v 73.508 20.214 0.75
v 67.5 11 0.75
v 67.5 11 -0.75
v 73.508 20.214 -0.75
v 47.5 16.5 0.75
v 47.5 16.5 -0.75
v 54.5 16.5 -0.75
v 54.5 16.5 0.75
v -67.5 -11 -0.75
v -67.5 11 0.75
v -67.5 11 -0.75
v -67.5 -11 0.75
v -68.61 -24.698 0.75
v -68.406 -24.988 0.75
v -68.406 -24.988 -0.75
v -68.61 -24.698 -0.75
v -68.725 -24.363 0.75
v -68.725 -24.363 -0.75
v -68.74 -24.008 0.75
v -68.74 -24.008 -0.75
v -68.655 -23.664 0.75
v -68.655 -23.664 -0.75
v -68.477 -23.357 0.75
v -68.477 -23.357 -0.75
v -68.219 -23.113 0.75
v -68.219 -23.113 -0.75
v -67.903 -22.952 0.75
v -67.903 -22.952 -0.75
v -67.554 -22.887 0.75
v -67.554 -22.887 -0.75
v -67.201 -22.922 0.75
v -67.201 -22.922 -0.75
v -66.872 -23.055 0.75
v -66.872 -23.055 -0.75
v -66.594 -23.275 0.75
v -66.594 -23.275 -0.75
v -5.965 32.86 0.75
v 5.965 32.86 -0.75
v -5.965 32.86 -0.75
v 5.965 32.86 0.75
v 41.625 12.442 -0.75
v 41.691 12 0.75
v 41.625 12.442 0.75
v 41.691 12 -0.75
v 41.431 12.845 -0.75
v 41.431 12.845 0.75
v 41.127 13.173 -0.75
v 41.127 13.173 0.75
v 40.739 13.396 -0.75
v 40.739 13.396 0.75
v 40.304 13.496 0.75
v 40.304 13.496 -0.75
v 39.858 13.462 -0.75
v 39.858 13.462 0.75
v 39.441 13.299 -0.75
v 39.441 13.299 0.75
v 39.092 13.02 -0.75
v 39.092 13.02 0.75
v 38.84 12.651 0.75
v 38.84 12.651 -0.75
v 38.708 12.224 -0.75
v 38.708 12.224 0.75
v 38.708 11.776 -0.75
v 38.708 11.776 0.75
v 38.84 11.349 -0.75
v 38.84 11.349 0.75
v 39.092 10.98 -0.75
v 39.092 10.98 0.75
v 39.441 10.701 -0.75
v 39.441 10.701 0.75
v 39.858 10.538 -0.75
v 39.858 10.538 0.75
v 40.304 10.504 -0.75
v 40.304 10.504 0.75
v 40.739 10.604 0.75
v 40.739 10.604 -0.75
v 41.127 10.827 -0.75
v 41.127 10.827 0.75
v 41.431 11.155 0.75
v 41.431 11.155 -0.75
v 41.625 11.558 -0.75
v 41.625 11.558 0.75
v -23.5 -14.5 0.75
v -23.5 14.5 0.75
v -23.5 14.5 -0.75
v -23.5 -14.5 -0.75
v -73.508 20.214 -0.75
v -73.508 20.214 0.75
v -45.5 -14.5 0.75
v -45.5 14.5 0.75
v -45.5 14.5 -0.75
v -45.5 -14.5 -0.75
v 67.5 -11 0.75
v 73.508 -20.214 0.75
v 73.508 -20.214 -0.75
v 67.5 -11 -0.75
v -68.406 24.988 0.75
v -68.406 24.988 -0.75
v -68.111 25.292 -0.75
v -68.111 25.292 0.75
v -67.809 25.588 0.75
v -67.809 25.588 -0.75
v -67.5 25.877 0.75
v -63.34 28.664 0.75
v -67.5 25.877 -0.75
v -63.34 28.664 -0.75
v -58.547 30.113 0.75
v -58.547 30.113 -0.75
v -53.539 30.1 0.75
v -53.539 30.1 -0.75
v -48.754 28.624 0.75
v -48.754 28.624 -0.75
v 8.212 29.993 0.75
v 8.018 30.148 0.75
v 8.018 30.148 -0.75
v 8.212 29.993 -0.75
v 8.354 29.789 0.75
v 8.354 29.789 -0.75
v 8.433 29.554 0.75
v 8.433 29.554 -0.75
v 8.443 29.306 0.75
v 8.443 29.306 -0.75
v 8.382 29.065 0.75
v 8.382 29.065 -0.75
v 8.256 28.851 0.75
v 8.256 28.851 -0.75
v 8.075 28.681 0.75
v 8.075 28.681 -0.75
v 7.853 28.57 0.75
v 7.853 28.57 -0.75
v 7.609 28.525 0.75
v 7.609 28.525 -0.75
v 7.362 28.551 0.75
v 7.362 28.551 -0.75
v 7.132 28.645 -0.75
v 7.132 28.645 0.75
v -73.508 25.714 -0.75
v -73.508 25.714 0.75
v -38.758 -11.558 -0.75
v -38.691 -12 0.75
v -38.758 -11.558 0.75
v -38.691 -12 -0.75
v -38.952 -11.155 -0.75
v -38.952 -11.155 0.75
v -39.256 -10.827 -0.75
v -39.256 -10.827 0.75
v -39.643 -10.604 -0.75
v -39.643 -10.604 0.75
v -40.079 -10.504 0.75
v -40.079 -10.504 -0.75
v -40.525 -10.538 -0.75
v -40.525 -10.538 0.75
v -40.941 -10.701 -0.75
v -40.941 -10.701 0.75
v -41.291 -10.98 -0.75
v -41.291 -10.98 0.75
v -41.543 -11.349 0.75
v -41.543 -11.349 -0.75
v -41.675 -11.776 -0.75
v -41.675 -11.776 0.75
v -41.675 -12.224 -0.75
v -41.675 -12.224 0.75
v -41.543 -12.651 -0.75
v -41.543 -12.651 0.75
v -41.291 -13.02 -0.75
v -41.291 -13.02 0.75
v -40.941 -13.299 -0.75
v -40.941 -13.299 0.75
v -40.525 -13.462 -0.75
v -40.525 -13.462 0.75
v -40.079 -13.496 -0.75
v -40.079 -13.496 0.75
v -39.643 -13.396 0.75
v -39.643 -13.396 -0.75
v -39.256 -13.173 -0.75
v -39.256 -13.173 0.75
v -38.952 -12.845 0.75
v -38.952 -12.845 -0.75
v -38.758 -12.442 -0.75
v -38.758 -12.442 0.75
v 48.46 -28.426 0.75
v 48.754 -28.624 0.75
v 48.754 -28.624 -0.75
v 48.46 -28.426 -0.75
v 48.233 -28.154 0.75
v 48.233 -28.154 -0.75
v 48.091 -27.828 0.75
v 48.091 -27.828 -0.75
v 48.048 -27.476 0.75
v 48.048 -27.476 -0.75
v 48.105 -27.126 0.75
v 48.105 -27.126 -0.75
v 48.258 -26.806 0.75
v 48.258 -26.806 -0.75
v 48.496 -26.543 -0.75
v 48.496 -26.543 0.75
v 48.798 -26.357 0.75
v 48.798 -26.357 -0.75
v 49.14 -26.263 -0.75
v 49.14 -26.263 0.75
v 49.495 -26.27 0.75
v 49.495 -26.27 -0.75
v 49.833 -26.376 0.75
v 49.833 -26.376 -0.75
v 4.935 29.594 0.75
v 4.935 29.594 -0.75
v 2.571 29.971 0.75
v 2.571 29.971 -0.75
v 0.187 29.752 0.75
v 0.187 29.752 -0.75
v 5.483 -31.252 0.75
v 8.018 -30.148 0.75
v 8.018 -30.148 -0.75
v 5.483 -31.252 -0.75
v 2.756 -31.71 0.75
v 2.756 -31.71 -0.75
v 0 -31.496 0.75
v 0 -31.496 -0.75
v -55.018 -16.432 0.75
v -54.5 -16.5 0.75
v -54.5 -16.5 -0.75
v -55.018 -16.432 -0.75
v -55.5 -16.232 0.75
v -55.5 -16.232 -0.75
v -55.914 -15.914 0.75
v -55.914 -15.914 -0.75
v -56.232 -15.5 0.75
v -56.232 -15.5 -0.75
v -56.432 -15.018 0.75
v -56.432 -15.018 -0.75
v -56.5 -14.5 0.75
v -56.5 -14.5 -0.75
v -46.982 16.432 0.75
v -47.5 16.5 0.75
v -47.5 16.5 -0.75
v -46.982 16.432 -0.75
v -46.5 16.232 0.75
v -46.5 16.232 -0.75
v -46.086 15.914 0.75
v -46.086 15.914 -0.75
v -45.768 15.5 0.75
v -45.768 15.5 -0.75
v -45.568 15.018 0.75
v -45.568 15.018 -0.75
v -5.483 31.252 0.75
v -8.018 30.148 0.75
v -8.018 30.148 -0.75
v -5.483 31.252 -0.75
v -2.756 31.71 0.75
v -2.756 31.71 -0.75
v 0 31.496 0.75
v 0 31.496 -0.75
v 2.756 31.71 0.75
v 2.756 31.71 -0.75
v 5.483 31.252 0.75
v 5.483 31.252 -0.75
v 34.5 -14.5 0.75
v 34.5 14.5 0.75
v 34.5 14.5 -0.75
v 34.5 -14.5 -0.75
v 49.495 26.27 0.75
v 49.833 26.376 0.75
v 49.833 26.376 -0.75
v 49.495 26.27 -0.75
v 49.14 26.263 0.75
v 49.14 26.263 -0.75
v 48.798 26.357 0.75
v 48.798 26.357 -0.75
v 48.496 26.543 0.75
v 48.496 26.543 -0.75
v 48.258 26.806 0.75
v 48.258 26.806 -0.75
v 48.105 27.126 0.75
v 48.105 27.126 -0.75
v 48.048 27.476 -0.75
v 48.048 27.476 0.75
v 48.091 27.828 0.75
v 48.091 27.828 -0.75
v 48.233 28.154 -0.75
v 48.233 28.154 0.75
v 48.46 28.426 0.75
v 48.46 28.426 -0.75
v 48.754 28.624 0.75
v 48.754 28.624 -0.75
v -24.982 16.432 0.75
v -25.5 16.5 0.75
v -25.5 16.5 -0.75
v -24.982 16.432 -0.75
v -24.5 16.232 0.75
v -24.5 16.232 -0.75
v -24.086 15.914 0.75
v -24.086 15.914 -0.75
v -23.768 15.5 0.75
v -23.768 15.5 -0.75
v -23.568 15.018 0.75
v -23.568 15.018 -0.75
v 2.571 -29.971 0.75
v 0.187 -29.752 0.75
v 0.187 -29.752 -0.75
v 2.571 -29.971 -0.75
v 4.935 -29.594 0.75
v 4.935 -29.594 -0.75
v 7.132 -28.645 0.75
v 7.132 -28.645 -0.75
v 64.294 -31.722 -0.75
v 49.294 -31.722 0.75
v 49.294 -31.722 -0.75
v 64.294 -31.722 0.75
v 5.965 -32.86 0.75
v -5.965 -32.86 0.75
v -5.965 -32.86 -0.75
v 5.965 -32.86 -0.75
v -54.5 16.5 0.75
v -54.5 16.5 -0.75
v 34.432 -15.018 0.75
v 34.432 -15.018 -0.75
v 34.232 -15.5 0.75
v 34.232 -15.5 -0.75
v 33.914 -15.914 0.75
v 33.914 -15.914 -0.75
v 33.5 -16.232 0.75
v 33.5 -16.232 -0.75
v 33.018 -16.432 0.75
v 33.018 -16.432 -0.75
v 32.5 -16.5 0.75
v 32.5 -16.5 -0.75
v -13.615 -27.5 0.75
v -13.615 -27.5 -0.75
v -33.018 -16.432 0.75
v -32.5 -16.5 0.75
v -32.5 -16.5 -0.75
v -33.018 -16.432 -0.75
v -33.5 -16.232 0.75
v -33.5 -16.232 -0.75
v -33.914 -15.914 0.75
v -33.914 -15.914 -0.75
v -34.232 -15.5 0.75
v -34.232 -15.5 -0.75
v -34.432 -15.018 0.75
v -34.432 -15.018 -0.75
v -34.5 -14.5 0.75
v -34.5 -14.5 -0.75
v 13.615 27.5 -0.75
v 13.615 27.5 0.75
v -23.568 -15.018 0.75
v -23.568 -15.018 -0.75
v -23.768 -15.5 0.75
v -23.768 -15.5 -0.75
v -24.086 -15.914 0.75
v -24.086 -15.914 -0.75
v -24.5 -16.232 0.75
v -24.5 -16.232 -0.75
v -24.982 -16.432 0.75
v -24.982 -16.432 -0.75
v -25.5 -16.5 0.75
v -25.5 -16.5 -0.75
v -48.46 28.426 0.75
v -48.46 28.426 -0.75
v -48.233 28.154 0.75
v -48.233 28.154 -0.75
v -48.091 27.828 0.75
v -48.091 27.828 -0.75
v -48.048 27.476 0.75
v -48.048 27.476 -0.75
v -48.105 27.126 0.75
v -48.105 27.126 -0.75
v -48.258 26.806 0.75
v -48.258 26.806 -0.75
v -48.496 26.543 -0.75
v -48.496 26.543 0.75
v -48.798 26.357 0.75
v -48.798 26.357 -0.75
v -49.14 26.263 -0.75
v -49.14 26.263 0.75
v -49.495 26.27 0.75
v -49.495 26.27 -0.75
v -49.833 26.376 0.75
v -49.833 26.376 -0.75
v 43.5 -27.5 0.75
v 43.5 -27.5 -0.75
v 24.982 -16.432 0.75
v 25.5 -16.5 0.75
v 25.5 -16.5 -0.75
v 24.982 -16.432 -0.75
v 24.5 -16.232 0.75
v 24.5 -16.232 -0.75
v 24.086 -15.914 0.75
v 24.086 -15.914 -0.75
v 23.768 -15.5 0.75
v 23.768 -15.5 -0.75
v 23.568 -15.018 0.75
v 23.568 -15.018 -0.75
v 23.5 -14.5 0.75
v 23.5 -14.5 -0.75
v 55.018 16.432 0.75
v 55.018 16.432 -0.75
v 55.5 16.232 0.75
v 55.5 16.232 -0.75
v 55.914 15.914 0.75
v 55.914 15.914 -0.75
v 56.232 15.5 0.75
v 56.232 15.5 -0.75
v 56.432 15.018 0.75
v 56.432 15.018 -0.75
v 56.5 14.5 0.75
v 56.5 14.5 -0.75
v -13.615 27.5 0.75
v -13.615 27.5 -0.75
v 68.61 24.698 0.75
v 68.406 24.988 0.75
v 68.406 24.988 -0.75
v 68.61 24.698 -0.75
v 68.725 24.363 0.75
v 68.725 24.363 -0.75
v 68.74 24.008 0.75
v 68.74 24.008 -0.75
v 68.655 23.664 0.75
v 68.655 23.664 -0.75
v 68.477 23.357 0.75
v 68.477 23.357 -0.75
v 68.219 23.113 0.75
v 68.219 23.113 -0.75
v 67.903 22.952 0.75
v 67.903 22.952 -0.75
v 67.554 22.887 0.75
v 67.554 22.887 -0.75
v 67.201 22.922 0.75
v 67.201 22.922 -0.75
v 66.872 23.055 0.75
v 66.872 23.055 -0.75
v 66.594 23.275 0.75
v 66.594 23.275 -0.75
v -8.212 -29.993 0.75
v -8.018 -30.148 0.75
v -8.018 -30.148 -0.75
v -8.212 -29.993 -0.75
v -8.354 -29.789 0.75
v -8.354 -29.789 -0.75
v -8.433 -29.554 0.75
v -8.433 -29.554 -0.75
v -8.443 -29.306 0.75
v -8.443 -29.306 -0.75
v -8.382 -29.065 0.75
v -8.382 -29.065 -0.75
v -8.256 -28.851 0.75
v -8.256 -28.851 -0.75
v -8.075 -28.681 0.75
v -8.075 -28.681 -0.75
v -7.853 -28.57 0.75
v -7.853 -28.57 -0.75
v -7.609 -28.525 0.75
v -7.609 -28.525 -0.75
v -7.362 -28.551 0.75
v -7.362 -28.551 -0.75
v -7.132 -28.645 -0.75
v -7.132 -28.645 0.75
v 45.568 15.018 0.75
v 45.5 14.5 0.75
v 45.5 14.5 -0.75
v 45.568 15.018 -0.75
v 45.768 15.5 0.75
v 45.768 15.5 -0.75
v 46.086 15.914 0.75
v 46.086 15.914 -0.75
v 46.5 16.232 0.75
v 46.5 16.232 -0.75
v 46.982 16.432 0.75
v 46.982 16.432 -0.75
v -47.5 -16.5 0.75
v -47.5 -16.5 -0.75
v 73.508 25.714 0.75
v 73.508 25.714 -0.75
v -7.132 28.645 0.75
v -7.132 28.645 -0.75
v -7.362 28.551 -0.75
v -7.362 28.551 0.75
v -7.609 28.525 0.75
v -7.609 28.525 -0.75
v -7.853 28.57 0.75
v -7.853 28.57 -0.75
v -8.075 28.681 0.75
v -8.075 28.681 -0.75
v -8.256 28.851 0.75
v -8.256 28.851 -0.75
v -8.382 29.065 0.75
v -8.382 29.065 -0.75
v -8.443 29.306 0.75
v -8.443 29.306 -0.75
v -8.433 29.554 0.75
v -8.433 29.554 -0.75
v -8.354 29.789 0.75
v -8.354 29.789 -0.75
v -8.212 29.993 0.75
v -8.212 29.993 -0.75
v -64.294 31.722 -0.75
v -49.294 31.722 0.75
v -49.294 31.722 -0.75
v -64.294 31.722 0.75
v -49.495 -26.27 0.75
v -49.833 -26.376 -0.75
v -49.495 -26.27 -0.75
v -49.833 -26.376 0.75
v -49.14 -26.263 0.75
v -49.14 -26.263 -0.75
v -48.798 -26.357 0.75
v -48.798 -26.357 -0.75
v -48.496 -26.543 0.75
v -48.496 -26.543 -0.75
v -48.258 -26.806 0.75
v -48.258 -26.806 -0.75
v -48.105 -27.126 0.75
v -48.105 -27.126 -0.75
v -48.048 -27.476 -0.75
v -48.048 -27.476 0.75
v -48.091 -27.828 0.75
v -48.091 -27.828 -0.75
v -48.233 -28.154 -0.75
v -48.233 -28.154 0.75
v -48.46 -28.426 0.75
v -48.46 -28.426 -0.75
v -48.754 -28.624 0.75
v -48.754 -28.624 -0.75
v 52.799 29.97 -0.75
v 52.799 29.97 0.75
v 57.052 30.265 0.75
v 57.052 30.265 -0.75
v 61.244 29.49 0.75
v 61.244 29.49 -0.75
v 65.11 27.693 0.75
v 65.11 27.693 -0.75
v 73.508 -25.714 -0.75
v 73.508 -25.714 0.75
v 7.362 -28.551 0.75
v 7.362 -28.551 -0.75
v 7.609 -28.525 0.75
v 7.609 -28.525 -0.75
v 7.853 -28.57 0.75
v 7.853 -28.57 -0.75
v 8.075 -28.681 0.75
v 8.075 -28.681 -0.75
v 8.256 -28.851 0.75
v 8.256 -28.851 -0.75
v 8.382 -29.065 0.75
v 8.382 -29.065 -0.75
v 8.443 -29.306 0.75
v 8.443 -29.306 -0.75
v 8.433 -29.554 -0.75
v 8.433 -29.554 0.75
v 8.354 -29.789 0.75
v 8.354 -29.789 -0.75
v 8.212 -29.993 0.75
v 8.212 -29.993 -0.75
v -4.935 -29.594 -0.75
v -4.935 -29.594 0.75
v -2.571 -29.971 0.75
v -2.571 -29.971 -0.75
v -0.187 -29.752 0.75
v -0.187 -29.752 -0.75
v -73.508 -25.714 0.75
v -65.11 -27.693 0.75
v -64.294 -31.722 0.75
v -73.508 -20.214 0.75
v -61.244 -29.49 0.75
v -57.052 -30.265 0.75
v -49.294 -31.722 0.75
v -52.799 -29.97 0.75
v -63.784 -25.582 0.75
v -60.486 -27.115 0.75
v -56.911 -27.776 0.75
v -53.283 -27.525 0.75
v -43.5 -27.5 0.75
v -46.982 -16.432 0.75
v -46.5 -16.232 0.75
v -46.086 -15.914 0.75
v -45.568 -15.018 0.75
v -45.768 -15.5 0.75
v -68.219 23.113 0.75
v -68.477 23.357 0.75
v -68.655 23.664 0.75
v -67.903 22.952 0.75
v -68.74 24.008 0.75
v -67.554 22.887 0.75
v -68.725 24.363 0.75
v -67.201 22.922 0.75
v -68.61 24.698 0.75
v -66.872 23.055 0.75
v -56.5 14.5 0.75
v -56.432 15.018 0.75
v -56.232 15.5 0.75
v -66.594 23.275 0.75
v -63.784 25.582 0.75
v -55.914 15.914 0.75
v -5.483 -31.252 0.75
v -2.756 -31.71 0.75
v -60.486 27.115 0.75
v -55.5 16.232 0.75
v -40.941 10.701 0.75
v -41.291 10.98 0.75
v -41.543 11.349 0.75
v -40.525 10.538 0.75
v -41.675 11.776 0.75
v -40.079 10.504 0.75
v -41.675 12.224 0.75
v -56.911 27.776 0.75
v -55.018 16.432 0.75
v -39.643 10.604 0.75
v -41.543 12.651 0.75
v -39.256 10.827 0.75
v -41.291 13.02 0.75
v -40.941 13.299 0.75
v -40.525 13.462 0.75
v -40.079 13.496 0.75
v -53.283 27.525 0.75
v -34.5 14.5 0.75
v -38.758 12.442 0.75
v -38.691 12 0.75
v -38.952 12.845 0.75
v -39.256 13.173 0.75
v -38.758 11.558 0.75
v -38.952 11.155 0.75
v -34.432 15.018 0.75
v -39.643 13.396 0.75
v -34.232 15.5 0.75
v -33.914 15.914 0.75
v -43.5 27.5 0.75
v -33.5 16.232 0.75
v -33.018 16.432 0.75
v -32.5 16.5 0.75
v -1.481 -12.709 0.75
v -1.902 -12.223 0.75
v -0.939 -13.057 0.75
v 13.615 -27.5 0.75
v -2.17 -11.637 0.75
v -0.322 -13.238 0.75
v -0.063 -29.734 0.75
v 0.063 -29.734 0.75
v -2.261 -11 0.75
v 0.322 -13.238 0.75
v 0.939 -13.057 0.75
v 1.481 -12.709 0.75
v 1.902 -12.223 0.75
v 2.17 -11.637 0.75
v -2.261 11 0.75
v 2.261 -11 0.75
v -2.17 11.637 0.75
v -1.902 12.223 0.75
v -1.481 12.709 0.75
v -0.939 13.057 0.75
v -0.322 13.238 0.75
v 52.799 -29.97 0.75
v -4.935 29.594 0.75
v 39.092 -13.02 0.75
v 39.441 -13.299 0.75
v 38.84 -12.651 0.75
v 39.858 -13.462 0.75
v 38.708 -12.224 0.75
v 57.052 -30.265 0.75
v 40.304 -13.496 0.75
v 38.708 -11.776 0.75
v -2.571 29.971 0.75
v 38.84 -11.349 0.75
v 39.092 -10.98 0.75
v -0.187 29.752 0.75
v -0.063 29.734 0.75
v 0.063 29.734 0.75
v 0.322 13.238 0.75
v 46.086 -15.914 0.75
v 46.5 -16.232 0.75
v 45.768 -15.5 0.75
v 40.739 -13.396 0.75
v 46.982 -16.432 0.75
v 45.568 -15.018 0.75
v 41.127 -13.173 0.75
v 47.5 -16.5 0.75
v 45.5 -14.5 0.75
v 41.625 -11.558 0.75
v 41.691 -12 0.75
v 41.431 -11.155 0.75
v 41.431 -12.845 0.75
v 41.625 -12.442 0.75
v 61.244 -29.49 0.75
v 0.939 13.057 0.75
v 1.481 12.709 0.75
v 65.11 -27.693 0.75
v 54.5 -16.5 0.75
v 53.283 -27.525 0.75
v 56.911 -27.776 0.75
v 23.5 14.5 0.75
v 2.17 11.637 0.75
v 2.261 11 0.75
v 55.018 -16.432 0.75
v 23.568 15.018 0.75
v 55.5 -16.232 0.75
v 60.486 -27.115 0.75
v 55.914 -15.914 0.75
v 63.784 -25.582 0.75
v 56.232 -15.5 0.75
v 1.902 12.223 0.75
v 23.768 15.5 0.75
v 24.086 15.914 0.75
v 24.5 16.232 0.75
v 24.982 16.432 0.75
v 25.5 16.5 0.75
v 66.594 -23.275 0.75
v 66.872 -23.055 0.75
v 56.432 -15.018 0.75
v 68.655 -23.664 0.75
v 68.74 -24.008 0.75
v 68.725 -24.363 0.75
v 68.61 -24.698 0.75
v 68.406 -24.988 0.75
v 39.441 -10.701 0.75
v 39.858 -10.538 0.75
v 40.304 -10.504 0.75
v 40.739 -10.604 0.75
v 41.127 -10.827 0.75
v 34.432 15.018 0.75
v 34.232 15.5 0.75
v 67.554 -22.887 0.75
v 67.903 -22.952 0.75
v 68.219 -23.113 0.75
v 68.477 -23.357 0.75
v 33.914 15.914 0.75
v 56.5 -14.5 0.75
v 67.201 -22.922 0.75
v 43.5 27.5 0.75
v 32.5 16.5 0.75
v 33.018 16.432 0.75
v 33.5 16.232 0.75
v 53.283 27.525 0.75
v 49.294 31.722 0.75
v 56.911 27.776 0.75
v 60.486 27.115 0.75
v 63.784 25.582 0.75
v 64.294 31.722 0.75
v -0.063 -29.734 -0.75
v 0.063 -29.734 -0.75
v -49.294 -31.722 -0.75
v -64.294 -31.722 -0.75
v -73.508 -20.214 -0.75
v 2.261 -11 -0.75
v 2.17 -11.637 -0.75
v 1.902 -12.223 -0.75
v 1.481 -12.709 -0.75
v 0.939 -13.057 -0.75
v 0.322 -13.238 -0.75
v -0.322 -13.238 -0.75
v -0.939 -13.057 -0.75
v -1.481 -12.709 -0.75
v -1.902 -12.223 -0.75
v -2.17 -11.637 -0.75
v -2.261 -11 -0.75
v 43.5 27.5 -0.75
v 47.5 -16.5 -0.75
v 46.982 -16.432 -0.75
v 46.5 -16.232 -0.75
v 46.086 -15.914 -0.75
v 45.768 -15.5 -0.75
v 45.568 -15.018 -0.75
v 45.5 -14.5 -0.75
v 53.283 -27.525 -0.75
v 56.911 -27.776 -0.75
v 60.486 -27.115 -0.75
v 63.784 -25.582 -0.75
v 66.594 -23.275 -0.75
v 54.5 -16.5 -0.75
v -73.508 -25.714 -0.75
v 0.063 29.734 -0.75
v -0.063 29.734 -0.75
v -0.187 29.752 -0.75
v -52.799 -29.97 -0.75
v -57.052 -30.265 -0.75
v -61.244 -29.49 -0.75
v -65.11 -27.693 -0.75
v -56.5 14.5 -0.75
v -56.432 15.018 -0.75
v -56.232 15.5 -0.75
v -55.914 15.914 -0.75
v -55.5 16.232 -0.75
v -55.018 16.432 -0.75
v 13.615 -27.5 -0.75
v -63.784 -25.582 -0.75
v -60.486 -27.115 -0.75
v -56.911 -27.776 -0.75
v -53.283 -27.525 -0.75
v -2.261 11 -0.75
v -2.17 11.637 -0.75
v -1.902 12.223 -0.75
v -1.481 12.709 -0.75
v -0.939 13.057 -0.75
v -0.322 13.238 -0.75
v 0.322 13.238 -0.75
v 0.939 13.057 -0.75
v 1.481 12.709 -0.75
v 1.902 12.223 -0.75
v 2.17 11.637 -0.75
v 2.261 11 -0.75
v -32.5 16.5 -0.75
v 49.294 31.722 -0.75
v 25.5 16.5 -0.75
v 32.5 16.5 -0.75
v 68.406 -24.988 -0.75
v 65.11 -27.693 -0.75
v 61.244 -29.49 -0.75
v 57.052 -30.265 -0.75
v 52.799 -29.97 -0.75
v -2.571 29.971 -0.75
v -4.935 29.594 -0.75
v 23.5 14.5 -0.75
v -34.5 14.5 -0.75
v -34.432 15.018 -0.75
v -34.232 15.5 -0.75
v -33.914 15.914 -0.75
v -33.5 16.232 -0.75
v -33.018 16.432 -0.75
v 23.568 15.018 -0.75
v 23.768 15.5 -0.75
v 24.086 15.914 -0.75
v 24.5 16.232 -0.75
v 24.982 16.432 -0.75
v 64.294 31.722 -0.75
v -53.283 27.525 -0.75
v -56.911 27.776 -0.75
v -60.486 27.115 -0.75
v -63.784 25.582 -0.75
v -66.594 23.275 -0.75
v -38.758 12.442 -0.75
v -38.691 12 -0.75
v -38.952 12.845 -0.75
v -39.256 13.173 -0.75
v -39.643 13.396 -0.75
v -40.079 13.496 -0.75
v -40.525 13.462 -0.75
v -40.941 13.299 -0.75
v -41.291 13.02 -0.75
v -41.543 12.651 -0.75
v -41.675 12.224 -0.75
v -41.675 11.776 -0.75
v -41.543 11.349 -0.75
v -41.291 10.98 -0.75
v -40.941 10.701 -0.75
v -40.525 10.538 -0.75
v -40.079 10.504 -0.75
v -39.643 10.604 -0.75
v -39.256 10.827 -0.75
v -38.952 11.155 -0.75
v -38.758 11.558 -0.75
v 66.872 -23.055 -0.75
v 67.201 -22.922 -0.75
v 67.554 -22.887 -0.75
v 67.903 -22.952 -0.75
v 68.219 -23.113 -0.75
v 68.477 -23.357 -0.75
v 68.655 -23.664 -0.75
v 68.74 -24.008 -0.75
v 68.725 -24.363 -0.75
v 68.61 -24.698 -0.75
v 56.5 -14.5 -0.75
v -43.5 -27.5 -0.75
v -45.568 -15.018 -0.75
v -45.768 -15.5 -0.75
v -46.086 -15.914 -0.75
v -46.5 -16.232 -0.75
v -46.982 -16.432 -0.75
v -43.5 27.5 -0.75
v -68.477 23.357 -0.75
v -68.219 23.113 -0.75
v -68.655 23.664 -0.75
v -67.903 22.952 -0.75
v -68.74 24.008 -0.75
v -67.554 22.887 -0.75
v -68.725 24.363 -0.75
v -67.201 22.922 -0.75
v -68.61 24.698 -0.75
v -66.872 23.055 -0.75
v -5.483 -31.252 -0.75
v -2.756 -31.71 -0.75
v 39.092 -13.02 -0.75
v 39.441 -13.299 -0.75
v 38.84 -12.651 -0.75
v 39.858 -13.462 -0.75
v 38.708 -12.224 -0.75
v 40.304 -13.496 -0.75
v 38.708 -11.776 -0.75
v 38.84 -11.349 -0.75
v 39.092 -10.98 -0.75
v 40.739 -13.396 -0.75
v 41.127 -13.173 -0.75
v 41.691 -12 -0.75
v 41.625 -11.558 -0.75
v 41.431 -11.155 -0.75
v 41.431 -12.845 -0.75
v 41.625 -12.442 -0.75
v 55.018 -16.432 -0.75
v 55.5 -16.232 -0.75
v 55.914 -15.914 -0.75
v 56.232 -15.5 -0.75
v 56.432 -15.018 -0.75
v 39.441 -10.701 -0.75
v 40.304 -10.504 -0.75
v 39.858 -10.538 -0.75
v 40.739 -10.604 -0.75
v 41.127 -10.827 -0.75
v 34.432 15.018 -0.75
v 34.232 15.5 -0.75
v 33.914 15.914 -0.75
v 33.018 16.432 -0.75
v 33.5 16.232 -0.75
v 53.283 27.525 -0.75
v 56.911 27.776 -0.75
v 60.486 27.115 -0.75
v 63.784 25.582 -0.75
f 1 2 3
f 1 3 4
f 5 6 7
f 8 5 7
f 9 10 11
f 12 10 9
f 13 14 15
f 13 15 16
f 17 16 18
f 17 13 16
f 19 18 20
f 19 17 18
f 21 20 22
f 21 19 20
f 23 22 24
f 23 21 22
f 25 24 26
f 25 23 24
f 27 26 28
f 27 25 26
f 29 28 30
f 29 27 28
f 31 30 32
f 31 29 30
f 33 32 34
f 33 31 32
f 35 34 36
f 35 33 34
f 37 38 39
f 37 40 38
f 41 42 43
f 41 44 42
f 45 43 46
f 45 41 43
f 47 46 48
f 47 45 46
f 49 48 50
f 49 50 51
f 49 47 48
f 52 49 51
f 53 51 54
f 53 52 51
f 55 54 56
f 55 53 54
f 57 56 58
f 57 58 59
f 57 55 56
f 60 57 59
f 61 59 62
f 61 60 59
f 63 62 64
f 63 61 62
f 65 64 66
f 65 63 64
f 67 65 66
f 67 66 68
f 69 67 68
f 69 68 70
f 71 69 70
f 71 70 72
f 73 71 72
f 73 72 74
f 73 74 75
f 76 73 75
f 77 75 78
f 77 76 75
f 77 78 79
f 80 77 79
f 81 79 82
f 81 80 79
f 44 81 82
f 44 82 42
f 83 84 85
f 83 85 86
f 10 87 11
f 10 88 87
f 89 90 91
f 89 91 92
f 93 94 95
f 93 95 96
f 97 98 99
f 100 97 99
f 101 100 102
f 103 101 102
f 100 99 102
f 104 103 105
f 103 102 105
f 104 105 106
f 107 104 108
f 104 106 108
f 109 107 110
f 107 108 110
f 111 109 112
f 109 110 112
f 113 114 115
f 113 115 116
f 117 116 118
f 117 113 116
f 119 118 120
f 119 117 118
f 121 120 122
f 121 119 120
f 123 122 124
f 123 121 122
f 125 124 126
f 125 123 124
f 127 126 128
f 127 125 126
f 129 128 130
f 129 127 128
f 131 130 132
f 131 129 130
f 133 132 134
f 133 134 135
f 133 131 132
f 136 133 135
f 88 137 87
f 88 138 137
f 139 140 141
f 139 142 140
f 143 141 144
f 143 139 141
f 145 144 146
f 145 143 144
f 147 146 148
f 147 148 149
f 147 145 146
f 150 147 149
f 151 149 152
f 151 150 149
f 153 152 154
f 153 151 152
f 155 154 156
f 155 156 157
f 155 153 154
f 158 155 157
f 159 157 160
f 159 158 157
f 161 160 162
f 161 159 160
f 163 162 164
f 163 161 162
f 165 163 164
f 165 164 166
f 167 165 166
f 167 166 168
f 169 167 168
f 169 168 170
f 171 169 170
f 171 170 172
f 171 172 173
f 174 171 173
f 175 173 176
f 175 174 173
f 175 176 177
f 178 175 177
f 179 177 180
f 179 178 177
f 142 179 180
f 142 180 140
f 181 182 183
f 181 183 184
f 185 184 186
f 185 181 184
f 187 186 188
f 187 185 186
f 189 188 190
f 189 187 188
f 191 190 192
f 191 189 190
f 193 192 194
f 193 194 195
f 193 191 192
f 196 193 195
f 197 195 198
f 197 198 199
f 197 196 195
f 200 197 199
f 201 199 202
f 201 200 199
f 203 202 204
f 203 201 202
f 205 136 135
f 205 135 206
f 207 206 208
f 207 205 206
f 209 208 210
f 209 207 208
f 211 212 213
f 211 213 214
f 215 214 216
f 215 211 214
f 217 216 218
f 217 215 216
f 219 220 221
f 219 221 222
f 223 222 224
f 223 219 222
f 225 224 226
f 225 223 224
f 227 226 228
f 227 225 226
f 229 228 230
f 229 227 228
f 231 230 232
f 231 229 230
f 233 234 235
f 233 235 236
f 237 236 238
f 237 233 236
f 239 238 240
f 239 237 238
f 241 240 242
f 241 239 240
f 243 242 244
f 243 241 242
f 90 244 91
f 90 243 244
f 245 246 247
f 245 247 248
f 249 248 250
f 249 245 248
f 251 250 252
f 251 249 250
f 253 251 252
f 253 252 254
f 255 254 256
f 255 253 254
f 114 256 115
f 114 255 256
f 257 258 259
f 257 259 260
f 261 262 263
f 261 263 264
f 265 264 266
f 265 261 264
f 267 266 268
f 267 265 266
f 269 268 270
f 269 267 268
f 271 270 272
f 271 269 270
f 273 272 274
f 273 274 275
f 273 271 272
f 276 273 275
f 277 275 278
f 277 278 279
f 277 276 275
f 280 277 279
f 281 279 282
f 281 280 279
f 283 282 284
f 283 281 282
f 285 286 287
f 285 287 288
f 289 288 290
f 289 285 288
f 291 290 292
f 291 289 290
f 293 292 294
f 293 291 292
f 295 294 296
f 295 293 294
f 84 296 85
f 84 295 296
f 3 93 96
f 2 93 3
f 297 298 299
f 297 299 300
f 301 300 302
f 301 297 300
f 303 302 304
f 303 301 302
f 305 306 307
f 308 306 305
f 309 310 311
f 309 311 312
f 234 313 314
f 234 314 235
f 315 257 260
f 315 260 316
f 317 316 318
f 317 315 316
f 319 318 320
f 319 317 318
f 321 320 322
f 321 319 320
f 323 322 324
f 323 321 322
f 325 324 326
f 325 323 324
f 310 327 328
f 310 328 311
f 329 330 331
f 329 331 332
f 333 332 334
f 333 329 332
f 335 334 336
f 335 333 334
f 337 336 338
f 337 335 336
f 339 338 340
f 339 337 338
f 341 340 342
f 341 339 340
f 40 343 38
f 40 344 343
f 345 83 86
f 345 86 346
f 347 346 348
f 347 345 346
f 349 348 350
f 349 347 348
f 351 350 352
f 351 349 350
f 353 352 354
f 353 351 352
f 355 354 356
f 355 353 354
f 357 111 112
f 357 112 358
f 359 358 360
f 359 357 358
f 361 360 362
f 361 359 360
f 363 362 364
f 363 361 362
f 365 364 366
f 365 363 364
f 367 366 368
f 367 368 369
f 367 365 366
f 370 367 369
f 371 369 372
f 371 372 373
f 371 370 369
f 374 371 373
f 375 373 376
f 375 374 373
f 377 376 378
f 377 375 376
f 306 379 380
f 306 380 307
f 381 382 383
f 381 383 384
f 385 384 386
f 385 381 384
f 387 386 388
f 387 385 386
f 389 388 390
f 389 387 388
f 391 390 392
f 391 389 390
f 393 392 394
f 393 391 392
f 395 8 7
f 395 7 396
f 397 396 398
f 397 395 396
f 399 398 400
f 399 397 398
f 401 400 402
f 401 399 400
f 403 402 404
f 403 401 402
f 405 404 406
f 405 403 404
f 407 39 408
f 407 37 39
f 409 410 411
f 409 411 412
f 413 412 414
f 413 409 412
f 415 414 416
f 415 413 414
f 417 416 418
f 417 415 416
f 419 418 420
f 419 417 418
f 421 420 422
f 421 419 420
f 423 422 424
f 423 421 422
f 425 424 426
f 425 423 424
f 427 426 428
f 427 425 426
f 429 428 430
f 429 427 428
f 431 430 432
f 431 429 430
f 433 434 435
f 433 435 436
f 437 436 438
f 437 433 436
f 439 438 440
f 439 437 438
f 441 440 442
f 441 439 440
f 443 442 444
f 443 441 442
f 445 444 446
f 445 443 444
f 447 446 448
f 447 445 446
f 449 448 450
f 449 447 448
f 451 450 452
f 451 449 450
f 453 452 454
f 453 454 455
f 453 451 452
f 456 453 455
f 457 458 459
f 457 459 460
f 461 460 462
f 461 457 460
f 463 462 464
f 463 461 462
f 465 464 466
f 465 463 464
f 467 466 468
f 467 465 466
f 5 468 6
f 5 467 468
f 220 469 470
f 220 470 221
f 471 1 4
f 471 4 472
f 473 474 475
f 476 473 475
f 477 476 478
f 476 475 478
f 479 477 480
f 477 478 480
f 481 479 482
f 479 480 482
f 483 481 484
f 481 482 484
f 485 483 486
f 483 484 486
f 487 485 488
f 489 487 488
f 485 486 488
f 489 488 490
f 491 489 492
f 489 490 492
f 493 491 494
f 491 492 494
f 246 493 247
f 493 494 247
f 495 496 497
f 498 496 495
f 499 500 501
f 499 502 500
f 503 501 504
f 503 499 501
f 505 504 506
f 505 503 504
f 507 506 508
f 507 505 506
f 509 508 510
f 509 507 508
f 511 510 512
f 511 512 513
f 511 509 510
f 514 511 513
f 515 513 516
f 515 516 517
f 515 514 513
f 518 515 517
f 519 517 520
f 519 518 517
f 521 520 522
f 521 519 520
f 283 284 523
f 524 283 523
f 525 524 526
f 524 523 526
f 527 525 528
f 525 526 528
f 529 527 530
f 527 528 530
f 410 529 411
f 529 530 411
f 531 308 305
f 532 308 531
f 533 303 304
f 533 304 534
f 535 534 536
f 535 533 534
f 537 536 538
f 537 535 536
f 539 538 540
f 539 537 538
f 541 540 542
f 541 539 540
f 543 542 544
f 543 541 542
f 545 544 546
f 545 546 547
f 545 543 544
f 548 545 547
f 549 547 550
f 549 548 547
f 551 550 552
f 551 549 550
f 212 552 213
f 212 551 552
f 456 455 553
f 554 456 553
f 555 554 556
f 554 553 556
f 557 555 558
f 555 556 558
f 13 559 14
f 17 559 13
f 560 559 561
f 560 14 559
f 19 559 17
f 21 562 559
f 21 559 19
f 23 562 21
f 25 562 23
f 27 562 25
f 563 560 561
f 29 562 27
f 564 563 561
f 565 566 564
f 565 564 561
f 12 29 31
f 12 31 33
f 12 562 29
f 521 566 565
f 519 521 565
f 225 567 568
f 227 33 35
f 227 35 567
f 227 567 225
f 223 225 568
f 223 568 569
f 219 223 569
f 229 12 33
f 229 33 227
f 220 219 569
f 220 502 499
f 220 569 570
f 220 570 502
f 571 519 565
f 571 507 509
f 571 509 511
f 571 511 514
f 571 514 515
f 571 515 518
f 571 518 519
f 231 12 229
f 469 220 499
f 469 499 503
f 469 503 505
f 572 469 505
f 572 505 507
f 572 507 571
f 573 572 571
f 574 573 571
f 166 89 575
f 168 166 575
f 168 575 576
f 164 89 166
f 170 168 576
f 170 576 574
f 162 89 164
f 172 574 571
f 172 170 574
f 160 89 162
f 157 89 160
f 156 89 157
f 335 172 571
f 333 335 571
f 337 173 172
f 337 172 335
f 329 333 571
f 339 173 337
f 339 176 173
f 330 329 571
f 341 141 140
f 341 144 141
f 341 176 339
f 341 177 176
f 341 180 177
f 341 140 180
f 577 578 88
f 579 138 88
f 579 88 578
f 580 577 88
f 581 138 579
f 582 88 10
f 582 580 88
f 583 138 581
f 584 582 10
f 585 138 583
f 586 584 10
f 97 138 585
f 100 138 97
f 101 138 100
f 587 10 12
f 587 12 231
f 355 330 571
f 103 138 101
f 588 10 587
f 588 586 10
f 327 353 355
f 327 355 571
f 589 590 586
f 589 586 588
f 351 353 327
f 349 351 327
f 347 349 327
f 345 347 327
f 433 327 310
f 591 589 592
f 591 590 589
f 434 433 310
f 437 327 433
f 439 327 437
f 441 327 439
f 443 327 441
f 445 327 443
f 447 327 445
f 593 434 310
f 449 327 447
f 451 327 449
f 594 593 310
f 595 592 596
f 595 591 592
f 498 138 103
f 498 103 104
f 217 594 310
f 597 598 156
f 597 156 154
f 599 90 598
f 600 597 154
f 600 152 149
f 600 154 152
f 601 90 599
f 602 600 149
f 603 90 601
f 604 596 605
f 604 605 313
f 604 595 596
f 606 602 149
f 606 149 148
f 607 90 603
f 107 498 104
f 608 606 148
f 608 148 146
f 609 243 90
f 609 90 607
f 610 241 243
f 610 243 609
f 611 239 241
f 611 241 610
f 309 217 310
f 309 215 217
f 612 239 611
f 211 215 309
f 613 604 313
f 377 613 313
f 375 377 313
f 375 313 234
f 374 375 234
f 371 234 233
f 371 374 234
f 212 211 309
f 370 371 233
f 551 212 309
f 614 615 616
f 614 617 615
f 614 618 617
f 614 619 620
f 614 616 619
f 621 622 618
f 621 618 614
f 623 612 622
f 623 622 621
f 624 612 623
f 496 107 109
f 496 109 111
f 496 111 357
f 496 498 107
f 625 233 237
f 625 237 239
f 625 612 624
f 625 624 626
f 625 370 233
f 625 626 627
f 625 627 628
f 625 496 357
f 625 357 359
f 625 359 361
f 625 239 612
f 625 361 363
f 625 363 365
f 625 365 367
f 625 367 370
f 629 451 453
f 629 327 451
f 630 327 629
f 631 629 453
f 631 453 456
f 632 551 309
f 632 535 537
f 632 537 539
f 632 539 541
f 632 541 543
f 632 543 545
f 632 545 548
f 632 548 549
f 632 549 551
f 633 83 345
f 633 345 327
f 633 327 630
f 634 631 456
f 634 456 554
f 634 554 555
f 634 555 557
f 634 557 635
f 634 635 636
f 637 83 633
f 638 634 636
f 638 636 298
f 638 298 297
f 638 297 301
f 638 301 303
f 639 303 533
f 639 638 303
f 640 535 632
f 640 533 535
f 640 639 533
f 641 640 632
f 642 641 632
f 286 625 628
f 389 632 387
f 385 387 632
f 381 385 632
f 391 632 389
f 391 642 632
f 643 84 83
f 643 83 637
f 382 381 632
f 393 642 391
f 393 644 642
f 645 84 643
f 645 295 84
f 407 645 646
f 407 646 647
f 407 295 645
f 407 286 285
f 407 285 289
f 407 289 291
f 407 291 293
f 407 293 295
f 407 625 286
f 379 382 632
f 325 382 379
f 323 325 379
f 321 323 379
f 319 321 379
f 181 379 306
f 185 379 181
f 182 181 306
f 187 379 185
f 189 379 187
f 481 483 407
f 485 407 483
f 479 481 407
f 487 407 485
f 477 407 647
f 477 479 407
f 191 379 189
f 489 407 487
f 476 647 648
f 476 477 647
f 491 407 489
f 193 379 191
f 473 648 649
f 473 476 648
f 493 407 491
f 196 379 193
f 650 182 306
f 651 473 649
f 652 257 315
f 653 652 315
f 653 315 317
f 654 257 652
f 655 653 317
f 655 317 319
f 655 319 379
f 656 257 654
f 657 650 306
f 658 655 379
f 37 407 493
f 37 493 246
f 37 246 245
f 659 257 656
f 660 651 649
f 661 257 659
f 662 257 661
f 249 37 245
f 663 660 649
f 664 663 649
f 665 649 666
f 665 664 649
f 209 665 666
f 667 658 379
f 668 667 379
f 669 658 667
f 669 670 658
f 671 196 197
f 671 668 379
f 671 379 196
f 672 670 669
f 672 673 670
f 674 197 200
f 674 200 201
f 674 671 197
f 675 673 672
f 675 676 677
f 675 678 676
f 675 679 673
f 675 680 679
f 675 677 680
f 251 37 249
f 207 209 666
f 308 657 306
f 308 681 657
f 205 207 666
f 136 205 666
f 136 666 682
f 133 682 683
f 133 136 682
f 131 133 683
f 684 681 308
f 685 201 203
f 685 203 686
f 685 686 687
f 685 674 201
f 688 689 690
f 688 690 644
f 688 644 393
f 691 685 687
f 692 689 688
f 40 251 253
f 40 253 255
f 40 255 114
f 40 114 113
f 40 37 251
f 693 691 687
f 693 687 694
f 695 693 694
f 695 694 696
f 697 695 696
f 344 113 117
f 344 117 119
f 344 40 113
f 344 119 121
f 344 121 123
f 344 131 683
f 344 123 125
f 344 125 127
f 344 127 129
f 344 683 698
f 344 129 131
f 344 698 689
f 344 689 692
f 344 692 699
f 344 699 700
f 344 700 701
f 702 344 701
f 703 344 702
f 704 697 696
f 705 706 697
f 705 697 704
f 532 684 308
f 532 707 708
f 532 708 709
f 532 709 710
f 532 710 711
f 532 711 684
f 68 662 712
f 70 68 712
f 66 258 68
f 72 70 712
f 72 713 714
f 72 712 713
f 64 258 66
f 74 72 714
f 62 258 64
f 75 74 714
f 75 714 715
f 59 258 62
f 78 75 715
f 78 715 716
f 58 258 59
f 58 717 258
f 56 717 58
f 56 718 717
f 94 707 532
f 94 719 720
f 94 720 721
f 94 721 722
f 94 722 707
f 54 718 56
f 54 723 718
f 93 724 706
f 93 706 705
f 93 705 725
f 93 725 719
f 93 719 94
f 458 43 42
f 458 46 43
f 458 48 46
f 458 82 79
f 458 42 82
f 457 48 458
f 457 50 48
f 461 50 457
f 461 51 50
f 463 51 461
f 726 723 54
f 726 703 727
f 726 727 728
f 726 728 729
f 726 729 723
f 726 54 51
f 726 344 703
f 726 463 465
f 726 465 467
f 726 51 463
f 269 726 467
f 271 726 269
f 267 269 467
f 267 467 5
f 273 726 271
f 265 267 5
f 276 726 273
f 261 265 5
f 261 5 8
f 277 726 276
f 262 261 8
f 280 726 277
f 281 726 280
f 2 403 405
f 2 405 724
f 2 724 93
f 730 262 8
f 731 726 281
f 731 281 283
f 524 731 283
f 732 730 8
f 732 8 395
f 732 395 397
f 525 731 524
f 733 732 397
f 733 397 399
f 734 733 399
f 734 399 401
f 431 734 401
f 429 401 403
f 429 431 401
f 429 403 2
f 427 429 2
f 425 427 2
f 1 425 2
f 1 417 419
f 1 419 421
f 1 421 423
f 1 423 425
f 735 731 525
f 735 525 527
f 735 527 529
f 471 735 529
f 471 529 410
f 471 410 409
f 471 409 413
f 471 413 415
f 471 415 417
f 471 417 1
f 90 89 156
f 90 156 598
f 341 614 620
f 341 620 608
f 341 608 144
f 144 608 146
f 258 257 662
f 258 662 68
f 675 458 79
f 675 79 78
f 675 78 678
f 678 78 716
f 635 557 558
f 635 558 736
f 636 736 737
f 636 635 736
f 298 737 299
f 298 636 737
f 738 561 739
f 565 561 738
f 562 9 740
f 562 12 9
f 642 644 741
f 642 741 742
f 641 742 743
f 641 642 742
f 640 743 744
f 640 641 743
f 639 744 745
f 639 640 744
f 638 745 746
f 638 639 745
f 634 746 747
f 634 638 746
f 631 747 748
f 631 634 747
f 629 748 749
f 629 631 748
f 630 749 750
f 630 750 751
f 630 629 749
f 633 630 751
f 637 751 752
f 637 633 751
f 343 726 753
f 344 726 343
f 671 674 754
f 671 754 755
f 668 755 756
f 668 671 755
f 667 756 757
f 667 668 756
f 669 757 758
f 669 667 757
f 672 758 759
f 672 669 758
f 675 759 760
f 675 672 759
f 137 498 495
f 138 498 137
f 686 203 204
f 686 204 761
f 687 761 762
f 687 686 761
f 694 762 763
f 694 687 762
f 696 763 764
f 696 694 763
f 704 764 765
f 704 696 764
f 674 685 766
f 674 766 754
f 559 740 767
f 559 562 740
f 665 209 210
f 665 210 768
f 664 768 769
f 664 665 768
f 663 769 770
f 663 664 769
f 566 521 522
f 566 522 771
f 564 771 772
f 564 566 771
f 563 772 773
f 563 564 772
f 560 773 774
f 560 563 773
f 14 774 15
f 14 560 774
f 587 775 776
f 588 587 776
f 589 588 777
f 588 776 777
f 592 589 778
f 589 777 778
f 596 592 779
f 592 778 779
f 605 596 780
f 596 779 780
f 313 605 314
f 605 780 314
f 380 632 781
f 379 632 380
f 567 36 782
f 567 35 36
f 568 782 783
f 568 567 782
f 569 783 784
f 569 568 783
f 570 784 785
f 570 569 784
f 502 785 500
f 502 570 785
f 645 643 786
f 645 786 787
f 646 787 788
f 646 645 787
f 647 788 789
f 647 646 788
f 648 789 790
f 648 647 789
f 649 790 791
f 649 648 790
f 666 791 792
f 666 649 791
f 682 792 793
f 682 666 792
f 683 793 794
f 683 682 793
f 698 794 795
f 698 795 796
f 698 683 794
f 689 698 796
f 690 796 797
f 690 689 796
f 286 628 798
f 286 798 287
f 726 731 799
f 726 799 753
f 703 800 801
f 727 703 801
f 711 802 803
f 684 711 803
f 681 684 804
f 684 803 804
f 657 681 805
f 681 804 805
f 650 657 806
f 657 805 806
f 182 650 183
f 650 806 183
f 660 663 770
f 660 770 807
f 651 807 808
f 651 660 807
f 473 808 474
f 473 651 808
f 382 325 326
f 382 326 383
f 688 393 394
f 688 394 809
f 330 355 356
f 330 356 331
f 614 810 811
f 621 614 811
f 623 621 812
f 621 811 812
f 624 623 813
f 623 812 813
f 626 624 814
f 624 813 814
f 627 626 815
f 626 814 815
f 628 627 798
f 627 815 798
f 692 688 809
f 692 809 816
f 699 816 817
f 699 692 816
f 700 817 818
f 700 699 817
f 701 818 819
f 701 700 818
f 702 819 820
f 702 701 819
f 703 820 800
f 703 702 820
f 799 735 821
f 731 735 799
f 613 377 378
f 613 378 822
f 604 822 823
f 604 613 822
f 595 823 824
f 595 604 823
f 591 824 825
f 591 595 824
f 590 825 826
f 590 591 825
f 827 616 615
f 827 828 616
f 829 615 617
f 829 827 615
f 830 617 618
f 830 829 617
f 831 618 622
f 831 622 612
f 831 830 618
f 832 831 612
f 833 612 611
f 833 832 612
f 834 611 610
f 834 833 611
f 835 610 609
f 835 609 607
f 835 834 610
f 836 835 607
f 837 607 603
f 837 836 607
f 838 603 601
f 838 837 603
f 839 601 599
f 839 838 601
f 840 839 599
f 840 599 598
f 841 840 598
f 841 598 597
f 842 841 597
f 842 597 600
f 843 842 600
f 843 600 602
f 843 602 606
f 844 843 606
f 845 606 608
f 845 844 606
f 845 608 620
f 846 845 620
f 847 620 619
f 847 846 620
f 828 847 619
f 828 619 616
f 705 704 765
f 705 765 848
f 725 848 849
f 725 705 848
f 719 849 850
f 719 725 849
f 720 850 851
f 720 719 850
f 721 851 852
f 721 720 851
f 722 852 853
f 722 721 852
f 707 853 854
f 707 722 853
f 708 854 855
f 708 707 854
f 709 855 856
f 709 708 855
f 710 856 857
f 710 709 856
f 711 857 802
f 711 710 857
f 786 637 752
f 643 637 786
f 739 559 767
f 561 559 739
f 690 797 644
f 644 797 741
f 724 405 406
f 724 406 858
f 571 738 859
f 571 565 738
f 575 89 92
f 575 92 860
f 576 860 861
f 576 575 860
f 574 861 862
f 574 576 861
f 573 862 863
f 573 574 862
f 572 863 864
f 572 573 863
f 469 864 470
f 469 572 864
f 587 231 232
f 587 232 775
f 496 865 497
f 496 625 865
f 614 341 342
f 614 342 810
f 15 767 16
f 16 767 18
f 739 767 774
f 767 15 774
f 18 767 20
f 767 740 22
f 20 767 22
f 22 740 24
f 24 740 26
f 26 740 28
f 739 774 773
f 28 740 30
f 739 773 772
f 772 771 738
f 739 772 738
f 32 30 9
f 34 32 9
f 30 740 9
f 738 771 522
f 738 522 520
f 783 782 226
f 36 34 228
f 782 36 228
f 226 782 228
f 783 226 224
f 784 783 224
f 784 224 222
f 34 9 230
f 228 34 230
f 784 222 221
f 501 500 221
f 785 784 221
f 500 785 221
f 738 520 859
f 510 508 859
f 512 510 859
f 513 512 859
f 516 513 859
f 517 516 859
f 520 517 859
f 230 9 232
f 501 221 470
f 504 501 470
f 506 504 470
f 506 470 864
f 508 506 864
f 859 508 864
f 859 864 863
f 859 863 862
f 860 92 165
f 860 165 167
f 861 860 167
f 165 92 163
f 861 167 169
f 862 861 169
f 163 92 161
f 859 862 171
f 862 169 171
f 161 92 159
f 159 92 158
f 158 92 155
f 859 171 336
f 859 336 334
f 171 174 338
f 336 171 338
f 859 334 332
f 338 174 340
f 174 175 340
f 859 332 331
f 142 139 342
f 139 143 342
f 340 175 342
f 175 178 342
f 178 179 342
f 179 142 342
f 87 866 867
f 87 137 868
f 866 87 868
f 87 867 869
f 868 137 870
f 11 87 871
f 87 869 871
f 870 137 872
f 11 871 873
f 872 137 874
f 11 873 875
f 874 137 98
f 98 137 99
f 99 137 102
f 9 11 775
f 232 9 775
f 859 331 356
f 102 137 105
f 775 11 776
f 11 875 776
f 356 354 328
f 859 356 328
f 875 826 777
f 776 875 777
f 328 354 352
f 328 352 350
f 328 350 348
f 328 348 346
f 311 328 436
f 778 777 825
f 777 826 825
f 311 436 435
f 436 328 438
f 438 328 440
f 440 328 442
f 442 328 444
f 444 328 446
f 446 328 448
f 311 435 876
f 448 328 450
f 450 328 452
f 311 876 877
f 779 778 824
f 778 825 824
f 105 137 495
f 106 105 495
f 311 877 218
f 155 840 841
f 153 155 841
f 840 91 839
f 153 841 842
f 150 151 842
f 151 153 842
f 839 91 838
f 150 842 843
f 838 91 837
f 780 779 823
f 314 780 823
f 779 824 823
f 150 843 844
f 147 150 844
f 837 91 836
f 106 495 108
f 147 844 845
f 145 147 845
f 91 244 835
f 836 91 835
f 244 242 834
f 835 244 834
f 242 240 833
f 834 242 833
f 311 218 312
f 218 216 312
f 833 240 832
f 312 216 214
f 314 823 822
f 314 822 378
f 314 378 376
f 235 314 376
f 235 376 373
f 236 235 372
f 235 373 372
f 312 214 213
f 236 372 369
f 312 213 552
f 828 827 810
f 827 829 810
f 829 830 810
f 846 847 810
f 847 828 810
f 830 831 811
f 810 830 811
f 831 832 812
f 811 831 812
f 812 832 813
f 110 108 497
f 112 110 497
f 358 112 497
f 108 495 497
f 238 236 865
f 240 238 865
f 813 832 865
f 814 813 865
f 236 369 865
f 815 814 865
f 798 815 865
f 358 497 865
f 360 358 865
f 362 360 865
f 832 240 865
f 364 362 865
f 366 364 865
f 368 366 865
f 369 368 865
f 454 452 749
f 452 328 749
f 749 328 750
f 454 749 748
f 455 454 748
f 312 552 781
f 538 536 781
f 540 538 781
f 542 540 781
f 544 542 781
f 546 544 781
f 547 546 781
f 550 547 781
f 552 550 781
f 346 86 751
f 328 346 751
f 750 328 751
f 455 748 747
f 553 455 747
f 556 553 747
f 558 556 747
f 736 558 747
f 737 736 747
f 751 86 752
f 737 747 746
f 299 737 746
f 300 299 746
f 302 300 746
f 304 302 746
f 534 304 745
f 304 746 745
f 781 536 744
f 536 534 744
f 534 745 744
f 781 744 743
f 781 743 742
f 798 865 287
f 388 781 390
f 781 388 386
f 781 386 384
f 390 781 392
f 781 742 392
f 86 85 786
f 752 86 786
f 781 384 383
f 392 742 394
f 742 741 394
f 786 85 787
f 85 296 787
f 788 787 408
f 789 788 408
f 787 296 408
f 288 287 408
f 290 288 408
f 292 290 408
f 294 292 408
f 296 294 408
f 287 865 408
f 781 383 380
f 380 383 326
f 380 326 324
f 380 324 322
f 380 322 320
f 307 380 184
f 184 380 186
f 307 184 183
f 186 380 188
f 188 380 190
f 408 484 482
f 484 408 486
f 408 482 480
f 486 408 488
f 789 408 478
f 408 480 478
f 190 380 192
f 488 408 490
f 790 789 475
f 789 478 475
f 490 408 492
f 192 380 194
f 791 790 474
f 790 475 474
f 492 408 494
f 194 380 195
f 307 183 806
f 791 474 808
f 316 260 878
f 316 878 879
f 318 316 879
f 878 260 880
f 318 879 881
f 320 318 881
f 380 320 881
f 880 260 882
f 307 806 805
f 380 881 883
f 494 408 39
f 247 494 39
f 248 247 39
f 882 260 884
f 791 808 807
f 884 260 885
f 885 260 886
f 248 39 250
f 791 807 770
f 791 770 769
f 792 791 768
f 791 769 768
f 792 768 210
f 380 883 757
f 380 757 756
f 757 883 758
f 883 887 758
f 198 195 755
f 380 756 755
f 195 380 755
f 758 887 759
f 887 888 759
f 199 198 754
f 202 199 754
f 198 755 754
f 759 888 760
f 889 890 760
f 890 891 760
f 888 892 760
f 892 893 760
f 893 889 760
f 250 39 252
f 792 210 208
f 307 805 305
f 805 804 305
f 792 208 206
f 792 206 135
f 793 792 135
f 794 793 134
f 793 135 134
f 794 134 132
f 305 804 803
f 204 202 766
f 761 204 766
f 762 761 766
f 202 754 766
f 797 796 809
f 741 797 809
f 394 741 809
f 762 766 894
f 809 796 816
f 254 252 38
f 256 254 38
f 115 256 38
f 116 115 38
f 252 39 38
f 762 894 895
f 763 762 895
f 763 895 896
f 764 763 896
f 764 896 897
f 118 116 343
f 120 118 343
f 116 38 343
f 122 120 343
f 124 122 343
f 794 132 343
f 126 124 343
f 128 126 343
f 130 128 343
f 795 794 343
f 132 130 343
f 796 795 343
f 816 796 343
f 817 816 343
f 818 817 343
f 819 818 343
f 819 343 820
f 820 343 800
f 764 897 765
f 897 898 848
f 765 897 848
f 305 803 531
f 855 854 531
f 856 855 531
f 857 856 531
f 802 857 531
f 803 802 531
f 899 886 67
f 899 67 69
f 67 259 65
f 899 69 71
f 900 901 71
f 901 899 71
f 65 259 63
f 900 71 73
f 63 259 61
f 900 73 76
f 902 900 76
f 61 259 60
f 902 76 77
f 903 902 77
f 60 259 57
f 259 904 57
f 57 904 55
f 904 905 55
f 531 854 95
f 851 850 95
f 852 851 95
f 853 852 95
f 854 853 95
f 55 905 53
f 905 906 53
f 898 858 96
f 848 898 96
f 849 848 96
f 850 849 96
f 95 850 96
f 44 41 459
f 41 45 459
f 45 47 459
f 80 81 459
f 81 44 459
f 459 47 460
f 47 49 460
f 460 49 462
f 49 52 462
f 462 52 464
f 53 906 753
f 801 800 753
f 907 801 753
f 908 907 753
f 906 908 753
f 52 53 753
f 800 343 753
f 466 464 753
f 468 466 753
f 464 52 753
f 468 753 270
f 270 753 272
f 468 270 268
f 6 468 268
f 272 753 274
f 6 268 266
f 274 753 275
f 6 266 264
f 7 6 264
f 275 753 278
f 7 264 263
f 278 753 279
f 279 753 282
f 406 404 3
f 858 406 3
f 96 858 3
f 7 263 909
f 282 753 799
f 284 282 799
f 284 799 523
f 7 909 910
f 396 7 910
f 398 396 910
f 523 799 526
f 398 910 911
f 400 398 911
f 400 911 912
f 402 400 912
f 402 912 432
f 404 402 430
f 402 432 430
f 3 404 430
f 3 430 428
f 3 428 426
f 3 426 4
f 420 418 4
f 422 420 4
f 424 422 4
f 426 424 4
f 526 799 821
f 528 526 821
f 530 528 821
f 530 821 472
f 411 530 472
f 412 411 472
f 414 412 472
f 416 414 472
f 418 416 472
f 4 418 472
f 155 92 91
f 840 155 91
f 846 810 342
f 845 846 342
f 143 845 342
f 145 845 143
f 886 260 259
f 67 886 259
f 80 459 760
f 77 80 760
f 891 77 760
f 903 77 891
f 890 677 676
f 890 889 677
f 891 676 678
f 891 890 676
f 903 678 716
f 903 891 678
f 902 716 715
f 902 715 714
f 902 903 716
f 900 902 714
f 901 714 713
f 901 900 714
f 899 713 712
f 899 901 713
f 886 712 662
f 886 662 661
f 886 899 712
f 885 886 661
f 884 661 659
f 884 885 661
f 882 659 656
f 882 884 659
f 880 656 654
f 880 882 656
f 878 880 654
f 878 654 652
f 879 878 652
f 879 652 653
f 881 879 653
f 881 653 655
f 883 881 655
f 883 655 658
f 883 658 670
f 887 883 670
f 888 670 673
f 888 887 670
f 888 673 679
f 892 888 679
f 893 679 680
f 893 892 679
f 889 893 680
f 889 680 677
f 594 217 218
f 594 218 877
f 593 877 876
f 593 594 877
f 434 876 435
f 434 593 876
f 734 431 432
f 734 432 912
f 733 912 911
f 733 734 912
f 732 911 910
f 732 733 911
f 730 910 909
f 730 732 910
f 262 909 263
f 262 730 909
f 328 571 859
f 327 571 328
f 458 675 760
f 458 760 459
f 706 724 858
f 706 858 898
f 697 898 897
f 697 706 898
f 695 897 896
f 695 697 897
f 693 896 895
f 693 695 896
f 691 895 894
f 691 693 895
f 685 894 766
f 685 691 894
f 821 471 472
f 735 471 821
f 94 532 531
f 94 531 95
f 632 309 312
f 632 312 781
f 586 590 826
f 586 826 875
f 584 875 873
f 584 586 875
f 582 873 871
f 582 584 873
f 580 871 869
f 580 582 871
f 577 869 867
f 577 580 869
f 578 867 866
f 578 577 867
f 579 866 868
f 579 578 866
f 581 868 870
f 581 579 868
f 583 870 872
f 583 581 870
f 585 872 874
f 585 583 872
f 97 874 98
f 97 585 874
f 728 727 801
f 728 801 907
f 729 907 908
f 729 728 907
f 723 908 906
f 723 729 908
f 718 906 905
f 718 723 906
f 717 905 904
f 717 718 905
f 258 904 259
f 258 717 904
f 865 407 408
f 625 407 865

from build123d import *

# Parameters (mm, degrees)
SCHIZZO1_R                   = 1.5
ESTRUSIONE_ESTRUSIONE1_DEPTH = 0.75


with BuildPart() as part:
    # Schizzo1 → Estrusione-Estrusione1 (new body, symmetric)
    with BuildSketch(Plane.XY):
        Polygon((-43.5, -27.5), (-13.615232638, -27.5), (-5.964504028, -32.859521299), (5.964504028, -32.859521299), (13.615232638, -27.5), (43.5, -27.5), (49.293787181, -31.722358535), (64.293787181, -31.722358535), (73.508072858, -25.714285677), (73.508072858, -20.214285677), (67.5, -11), (67.5, 11), (73.508072858, 20.214285677), (73.508072858, 25.714285677), (64.293787181, 31.722358535), (49.293787181, 31.722358535), (43.5, 27.5), (13.615232638, 27.5), (5.964504028, 32.859521299), (-5.964504028, 32.859521299), (-13.615232638, 27.5), (-43.5, 27.5), (-49.293787181, 31.722358535), (-64.293787181, 31.722358535), (-73.508072858, 25.714285677), (-73.508072858, 20.214285677), (-67.5, 11), (-67.5, -11), (-73.508072858, -20.214285677), (-73.508072858, -25.714285677), (-64.293787181, -31.722358535), (-49.293787181, -31.722358535), align=None)
        with BuildLine():
            ThreePointArc((-48.754479002, -28.623738791), (-59.172775767, -30.009764998), (-68.405644393, -24.988200197))
            ThreePointArc((-68.405644393, -24.988200197), (-68.356417198, -23.226138607), (-66.594355607, -23.275365801))
            ThreePointArc((-66.594355607, -23.275365801), (-58.719274878, -27.558458065), (-49.83309536, -26.376261209))
            ThreePointArc((-49.83309536, -26.376261209), (-48.17004839, -26.960691821), (-48.754479002, -28.623738791))
        make_face(mode=Mode.SUBTRACT)
        with Locations((-40.191447808, -12)):
            Circle(SCHIZZO1_R, mode=Mode.SUBTRACT)
        with BuildLine():
            ThreePointArc((0, -31.496185519), (-4.133745369, -31.563971562), (-8.018095478, -30.148249145))
            ThreePointArc((-8.018095478, -30.148249145), (-8.326872952, -28.953648185), (-7.132271992, -28.644870711))
            ThreePointArc((-7.132271992, -28.644870711), (-3.764579281, -29.856257566), (-0.187146253, -29.75240554))
            ThreePointArc((-0.187146253, -29.75240554), (0, -29.732097651), (0.187146253, -29.75240554))
            ThreePointArc((0.187146253, -29.75240554), (3.764579281, -29.856257566), (7.132271992, -28.644870711))
            ThreePointArc((7.132271992, -28.644870711), (8.326872952, -28.953648185), (8.018095478, -30.148249145))
            ThreePointArc((8.018095478, -30.148249145), (4.133745369, -31.563971562), (0, -31.496185519))
        make_face(mode=Mode.SUBTRACT)
        with BuildLine():
            ThreePointArc((66.594355607, -23.275365801), (68.356417198, -23.226138607), (68.405644393, -24.988200197))
            ThreePointArc((68.405644393, -24.988200197), (59.172775767, -30.009764998), (48.754479002, -28.623738791))
            ThreePointArc((48.754479002, -28.623738791), (48.17004839, -26.960691821), (49.83309536, -26.376261209))
            ThreePointArc((49.83309536, -26.376261209), (58.719274878, -27.558458065), (66.594355607, -23.275365801))
        make_face(mode=Mode.SUBTRACT)
        with Locations((40.191447808, -12)):
            Circle(SCHIZZO1_R, mode=Mode.SUBTRACT)
        with BuildLine():
            Line((-47.5, -16.5), (-54.5, -16.5))
            ThreePointArc((-54.5, -16.5), (-55.914213562, -15.914213562), (-56.5, -14.5))
            Line((-56.5, -14.5), (-56.5, 14.5))
            ThreePointArc((-56.5, 14.5), (-55.914213562, 15.914213562), (-54.5, 16.5))
            Line((-54.5, 16.5), (-47.5, 16.5))
            ThreePointArc((-47.5, 16.5), (-46.085786438, 15.914213562), (-45.5, 14.5))
            Line((-45.5, 14.5), (-45.5, -14.5))
            ThreePointArc((-45.5, -14.5), (-46.085786438, -15.914213562), (-47.5, -16.5))
        make_face(mode=Mode.SUBTRACT)
        with Locations((-40.191447808, 12)):
            Circle(SCHIZZO1_R, mode=Mode.SUBTRACT)
        with BuildLine():
            Line((-25.5, -16.5), (-32.5, -16.5))
            ThreePointArc((-32.5, -16.5), (-33.914213562, -15.914213562), (-34.5, -14.5))
            Line((-34.5, -14.5), (-34.5, 14.5))
            ThreePointArc((-34.5, 14.5), (-33.914213562, 15.914213562), (-32.5, 16.5))
            Line((-32.5, 16.5), (-25.5, 16.5))
            ThreePointArc((-25.5, 16.5), (-24.085786438, 15.914213562), (-23.5, 14.5))
            Line((-23.5, 14.5), (-23.5, -14.5))
            ThreePointArc((-23.5, -14.5), (-24.085786438, -15.914213562), (-25.5, -16.5))
        make_face(mode=Mode.SUBTRACT)
        with BuildLine():
            ThreePointArc((-2.261398956, 11), (0, 13.261398956), (2.261398956, 11))
            Line((2.261398956, 11), (2.261398956, -11))
            ThreePointArc((2.261398956, -11), (0, -13.261398956), (-2.261398956, -11))
            Line((-2.261398956, -11), (-2.261398956, 11))
        make_face(mode=Mode.SUBTRACT)
        with BuildLine():
            ThreePointArc((-66.594355607, 23.275365801), (-68.356417198, 23.226138607), (-68.405644393, 24.988200197))
            ThreePointArc((-68.405644393, 24.988200197), (-67.961138694, 25.440973547), (-67.5, 25.876794757))
            ThreePointArc((-67.5, 25.876794757), (-58.546813094, 30.113494239), (-48.754479002, 28.623738791))
            ThreePointArc((-48.754479002, 28.623738791), (-48.17004839, 26.960691821), (-49.83309536, 26.376261209))
            ThreePointArc((-49.83309536, 26.376261209), (-58.719274878, 27.558458065), (-66.594355607, 23.275365801))
        make_face(mode=Mode.SUBTRACT)
        with BuildLine():
            ThreePointArc((25.5, -16.5), (24.085786438, -15.914213562), (23.5, -14.5))
            Line((23.5, -14.5), (23.5, 14.5))
            ThreePointArc((23.5, 14.5), (24.085786438, 15.914213562), (25.5, 16.5))
            Line((25.5, 16.5), (32.5, 16.5))
            ThreePointArc((32.5, 16.5), (33.914213562, 15.914213562), (34.5, 14.5))
            Line((34.5, 14.5), (34.5, -14.5))
            ThreePointArc((34.5, -14.5), (33.914213562, -15.914213562), (32.5, -16.5))
            Line((32.5, -16.5), (25.5, -16.5))
        make_face(mode=Mode.SUBTRACT)
        with BuildLine():
            ThreePointArc((47.5, -16.5), (46.085786438, -15.914213562), (45.5, -14.5))
            Line((45.5, -14.5), (45.5, 14.5))
            ThreePointArc((45.5, 14.5), (46.085786438, 15.914213562), (47.5, 16.5))
            Line((47.5, 16.5), (54.5, 16.5))
            ThreePointArc((54.5, 16.5), (55.914213562, 15.914213562), (56.5, 14.5))
            Line((56.5, 14.5), (56.5, -14.5))
            ThreePointArc((56.5, -14.5), (55.914213562, -15.914213562), (54.5, -16.5))
            Line((54.5, -16.5), (47.5, -16.5))
        make_face(mode=Mode.SUBTRACT)
        with Locations((40.191447808, 12)):
            Circle(SCHIZZO1_R, mode=Mode.SUBTRACT)
        with BuildLine():
            ThreePointArc((0.187146253, 29.75240554), (0, 29.732097651), (-0.187146253, 29.75240554))
            ThreePointArc((-0.187146253, 29.75240554), (-3.764579281, 29.856257566), (-7.132271992, 28.644870711))
            ThreePointArc((-7.132271992, 28.644870711), (-8.326872952, 28.953648185), (-8.018095478, 30.148249145))
            ThreePointArc((-8.018095478, 30.148249145), (-4.133745369, 31.563971562), (0, 31.496185519))
            ThreePointArc((0, 31.496185519), (4.133745369, 31.563971562), (8.018095478, 30.148249145))
            ThreePointArc((8.018095478, 30.148249145), (8.326872952, 28.953648185), (7.132271992, 28.644870711))
            ThreePointArc((7.132271992, 28.644870711), (3.764579281, 29.856257566), (0.187146253, 29.75240554))
        make_face(mode=Mode.SUBTRACT)
        with BuildLine():
            ThreePointArc((48.754479002, 28.623738791), (59.172775767, 30.009764998), (68.405644393, 24.988200197))
            ThreePointArc((68.405644393, 24.988200197), (68.356417198, 23.226138607), (66.594355607, 23.275365801))
            ThreePointArc((66.594355607, 23.275365801), (58.719274878, 27.558458065), (49.83309536, 26.376261209))
            ThreePointArc((49.83309536, 26.376261209), (48.17004839, 26.960691821), (48.754479002, 28.623738791))
        make_face(mode=Mode.SUBTRACT)
    extrude(amount=ESTRUSIONE_ESTRUSIONE1_DEPTH, both=True)


solid = part.part
